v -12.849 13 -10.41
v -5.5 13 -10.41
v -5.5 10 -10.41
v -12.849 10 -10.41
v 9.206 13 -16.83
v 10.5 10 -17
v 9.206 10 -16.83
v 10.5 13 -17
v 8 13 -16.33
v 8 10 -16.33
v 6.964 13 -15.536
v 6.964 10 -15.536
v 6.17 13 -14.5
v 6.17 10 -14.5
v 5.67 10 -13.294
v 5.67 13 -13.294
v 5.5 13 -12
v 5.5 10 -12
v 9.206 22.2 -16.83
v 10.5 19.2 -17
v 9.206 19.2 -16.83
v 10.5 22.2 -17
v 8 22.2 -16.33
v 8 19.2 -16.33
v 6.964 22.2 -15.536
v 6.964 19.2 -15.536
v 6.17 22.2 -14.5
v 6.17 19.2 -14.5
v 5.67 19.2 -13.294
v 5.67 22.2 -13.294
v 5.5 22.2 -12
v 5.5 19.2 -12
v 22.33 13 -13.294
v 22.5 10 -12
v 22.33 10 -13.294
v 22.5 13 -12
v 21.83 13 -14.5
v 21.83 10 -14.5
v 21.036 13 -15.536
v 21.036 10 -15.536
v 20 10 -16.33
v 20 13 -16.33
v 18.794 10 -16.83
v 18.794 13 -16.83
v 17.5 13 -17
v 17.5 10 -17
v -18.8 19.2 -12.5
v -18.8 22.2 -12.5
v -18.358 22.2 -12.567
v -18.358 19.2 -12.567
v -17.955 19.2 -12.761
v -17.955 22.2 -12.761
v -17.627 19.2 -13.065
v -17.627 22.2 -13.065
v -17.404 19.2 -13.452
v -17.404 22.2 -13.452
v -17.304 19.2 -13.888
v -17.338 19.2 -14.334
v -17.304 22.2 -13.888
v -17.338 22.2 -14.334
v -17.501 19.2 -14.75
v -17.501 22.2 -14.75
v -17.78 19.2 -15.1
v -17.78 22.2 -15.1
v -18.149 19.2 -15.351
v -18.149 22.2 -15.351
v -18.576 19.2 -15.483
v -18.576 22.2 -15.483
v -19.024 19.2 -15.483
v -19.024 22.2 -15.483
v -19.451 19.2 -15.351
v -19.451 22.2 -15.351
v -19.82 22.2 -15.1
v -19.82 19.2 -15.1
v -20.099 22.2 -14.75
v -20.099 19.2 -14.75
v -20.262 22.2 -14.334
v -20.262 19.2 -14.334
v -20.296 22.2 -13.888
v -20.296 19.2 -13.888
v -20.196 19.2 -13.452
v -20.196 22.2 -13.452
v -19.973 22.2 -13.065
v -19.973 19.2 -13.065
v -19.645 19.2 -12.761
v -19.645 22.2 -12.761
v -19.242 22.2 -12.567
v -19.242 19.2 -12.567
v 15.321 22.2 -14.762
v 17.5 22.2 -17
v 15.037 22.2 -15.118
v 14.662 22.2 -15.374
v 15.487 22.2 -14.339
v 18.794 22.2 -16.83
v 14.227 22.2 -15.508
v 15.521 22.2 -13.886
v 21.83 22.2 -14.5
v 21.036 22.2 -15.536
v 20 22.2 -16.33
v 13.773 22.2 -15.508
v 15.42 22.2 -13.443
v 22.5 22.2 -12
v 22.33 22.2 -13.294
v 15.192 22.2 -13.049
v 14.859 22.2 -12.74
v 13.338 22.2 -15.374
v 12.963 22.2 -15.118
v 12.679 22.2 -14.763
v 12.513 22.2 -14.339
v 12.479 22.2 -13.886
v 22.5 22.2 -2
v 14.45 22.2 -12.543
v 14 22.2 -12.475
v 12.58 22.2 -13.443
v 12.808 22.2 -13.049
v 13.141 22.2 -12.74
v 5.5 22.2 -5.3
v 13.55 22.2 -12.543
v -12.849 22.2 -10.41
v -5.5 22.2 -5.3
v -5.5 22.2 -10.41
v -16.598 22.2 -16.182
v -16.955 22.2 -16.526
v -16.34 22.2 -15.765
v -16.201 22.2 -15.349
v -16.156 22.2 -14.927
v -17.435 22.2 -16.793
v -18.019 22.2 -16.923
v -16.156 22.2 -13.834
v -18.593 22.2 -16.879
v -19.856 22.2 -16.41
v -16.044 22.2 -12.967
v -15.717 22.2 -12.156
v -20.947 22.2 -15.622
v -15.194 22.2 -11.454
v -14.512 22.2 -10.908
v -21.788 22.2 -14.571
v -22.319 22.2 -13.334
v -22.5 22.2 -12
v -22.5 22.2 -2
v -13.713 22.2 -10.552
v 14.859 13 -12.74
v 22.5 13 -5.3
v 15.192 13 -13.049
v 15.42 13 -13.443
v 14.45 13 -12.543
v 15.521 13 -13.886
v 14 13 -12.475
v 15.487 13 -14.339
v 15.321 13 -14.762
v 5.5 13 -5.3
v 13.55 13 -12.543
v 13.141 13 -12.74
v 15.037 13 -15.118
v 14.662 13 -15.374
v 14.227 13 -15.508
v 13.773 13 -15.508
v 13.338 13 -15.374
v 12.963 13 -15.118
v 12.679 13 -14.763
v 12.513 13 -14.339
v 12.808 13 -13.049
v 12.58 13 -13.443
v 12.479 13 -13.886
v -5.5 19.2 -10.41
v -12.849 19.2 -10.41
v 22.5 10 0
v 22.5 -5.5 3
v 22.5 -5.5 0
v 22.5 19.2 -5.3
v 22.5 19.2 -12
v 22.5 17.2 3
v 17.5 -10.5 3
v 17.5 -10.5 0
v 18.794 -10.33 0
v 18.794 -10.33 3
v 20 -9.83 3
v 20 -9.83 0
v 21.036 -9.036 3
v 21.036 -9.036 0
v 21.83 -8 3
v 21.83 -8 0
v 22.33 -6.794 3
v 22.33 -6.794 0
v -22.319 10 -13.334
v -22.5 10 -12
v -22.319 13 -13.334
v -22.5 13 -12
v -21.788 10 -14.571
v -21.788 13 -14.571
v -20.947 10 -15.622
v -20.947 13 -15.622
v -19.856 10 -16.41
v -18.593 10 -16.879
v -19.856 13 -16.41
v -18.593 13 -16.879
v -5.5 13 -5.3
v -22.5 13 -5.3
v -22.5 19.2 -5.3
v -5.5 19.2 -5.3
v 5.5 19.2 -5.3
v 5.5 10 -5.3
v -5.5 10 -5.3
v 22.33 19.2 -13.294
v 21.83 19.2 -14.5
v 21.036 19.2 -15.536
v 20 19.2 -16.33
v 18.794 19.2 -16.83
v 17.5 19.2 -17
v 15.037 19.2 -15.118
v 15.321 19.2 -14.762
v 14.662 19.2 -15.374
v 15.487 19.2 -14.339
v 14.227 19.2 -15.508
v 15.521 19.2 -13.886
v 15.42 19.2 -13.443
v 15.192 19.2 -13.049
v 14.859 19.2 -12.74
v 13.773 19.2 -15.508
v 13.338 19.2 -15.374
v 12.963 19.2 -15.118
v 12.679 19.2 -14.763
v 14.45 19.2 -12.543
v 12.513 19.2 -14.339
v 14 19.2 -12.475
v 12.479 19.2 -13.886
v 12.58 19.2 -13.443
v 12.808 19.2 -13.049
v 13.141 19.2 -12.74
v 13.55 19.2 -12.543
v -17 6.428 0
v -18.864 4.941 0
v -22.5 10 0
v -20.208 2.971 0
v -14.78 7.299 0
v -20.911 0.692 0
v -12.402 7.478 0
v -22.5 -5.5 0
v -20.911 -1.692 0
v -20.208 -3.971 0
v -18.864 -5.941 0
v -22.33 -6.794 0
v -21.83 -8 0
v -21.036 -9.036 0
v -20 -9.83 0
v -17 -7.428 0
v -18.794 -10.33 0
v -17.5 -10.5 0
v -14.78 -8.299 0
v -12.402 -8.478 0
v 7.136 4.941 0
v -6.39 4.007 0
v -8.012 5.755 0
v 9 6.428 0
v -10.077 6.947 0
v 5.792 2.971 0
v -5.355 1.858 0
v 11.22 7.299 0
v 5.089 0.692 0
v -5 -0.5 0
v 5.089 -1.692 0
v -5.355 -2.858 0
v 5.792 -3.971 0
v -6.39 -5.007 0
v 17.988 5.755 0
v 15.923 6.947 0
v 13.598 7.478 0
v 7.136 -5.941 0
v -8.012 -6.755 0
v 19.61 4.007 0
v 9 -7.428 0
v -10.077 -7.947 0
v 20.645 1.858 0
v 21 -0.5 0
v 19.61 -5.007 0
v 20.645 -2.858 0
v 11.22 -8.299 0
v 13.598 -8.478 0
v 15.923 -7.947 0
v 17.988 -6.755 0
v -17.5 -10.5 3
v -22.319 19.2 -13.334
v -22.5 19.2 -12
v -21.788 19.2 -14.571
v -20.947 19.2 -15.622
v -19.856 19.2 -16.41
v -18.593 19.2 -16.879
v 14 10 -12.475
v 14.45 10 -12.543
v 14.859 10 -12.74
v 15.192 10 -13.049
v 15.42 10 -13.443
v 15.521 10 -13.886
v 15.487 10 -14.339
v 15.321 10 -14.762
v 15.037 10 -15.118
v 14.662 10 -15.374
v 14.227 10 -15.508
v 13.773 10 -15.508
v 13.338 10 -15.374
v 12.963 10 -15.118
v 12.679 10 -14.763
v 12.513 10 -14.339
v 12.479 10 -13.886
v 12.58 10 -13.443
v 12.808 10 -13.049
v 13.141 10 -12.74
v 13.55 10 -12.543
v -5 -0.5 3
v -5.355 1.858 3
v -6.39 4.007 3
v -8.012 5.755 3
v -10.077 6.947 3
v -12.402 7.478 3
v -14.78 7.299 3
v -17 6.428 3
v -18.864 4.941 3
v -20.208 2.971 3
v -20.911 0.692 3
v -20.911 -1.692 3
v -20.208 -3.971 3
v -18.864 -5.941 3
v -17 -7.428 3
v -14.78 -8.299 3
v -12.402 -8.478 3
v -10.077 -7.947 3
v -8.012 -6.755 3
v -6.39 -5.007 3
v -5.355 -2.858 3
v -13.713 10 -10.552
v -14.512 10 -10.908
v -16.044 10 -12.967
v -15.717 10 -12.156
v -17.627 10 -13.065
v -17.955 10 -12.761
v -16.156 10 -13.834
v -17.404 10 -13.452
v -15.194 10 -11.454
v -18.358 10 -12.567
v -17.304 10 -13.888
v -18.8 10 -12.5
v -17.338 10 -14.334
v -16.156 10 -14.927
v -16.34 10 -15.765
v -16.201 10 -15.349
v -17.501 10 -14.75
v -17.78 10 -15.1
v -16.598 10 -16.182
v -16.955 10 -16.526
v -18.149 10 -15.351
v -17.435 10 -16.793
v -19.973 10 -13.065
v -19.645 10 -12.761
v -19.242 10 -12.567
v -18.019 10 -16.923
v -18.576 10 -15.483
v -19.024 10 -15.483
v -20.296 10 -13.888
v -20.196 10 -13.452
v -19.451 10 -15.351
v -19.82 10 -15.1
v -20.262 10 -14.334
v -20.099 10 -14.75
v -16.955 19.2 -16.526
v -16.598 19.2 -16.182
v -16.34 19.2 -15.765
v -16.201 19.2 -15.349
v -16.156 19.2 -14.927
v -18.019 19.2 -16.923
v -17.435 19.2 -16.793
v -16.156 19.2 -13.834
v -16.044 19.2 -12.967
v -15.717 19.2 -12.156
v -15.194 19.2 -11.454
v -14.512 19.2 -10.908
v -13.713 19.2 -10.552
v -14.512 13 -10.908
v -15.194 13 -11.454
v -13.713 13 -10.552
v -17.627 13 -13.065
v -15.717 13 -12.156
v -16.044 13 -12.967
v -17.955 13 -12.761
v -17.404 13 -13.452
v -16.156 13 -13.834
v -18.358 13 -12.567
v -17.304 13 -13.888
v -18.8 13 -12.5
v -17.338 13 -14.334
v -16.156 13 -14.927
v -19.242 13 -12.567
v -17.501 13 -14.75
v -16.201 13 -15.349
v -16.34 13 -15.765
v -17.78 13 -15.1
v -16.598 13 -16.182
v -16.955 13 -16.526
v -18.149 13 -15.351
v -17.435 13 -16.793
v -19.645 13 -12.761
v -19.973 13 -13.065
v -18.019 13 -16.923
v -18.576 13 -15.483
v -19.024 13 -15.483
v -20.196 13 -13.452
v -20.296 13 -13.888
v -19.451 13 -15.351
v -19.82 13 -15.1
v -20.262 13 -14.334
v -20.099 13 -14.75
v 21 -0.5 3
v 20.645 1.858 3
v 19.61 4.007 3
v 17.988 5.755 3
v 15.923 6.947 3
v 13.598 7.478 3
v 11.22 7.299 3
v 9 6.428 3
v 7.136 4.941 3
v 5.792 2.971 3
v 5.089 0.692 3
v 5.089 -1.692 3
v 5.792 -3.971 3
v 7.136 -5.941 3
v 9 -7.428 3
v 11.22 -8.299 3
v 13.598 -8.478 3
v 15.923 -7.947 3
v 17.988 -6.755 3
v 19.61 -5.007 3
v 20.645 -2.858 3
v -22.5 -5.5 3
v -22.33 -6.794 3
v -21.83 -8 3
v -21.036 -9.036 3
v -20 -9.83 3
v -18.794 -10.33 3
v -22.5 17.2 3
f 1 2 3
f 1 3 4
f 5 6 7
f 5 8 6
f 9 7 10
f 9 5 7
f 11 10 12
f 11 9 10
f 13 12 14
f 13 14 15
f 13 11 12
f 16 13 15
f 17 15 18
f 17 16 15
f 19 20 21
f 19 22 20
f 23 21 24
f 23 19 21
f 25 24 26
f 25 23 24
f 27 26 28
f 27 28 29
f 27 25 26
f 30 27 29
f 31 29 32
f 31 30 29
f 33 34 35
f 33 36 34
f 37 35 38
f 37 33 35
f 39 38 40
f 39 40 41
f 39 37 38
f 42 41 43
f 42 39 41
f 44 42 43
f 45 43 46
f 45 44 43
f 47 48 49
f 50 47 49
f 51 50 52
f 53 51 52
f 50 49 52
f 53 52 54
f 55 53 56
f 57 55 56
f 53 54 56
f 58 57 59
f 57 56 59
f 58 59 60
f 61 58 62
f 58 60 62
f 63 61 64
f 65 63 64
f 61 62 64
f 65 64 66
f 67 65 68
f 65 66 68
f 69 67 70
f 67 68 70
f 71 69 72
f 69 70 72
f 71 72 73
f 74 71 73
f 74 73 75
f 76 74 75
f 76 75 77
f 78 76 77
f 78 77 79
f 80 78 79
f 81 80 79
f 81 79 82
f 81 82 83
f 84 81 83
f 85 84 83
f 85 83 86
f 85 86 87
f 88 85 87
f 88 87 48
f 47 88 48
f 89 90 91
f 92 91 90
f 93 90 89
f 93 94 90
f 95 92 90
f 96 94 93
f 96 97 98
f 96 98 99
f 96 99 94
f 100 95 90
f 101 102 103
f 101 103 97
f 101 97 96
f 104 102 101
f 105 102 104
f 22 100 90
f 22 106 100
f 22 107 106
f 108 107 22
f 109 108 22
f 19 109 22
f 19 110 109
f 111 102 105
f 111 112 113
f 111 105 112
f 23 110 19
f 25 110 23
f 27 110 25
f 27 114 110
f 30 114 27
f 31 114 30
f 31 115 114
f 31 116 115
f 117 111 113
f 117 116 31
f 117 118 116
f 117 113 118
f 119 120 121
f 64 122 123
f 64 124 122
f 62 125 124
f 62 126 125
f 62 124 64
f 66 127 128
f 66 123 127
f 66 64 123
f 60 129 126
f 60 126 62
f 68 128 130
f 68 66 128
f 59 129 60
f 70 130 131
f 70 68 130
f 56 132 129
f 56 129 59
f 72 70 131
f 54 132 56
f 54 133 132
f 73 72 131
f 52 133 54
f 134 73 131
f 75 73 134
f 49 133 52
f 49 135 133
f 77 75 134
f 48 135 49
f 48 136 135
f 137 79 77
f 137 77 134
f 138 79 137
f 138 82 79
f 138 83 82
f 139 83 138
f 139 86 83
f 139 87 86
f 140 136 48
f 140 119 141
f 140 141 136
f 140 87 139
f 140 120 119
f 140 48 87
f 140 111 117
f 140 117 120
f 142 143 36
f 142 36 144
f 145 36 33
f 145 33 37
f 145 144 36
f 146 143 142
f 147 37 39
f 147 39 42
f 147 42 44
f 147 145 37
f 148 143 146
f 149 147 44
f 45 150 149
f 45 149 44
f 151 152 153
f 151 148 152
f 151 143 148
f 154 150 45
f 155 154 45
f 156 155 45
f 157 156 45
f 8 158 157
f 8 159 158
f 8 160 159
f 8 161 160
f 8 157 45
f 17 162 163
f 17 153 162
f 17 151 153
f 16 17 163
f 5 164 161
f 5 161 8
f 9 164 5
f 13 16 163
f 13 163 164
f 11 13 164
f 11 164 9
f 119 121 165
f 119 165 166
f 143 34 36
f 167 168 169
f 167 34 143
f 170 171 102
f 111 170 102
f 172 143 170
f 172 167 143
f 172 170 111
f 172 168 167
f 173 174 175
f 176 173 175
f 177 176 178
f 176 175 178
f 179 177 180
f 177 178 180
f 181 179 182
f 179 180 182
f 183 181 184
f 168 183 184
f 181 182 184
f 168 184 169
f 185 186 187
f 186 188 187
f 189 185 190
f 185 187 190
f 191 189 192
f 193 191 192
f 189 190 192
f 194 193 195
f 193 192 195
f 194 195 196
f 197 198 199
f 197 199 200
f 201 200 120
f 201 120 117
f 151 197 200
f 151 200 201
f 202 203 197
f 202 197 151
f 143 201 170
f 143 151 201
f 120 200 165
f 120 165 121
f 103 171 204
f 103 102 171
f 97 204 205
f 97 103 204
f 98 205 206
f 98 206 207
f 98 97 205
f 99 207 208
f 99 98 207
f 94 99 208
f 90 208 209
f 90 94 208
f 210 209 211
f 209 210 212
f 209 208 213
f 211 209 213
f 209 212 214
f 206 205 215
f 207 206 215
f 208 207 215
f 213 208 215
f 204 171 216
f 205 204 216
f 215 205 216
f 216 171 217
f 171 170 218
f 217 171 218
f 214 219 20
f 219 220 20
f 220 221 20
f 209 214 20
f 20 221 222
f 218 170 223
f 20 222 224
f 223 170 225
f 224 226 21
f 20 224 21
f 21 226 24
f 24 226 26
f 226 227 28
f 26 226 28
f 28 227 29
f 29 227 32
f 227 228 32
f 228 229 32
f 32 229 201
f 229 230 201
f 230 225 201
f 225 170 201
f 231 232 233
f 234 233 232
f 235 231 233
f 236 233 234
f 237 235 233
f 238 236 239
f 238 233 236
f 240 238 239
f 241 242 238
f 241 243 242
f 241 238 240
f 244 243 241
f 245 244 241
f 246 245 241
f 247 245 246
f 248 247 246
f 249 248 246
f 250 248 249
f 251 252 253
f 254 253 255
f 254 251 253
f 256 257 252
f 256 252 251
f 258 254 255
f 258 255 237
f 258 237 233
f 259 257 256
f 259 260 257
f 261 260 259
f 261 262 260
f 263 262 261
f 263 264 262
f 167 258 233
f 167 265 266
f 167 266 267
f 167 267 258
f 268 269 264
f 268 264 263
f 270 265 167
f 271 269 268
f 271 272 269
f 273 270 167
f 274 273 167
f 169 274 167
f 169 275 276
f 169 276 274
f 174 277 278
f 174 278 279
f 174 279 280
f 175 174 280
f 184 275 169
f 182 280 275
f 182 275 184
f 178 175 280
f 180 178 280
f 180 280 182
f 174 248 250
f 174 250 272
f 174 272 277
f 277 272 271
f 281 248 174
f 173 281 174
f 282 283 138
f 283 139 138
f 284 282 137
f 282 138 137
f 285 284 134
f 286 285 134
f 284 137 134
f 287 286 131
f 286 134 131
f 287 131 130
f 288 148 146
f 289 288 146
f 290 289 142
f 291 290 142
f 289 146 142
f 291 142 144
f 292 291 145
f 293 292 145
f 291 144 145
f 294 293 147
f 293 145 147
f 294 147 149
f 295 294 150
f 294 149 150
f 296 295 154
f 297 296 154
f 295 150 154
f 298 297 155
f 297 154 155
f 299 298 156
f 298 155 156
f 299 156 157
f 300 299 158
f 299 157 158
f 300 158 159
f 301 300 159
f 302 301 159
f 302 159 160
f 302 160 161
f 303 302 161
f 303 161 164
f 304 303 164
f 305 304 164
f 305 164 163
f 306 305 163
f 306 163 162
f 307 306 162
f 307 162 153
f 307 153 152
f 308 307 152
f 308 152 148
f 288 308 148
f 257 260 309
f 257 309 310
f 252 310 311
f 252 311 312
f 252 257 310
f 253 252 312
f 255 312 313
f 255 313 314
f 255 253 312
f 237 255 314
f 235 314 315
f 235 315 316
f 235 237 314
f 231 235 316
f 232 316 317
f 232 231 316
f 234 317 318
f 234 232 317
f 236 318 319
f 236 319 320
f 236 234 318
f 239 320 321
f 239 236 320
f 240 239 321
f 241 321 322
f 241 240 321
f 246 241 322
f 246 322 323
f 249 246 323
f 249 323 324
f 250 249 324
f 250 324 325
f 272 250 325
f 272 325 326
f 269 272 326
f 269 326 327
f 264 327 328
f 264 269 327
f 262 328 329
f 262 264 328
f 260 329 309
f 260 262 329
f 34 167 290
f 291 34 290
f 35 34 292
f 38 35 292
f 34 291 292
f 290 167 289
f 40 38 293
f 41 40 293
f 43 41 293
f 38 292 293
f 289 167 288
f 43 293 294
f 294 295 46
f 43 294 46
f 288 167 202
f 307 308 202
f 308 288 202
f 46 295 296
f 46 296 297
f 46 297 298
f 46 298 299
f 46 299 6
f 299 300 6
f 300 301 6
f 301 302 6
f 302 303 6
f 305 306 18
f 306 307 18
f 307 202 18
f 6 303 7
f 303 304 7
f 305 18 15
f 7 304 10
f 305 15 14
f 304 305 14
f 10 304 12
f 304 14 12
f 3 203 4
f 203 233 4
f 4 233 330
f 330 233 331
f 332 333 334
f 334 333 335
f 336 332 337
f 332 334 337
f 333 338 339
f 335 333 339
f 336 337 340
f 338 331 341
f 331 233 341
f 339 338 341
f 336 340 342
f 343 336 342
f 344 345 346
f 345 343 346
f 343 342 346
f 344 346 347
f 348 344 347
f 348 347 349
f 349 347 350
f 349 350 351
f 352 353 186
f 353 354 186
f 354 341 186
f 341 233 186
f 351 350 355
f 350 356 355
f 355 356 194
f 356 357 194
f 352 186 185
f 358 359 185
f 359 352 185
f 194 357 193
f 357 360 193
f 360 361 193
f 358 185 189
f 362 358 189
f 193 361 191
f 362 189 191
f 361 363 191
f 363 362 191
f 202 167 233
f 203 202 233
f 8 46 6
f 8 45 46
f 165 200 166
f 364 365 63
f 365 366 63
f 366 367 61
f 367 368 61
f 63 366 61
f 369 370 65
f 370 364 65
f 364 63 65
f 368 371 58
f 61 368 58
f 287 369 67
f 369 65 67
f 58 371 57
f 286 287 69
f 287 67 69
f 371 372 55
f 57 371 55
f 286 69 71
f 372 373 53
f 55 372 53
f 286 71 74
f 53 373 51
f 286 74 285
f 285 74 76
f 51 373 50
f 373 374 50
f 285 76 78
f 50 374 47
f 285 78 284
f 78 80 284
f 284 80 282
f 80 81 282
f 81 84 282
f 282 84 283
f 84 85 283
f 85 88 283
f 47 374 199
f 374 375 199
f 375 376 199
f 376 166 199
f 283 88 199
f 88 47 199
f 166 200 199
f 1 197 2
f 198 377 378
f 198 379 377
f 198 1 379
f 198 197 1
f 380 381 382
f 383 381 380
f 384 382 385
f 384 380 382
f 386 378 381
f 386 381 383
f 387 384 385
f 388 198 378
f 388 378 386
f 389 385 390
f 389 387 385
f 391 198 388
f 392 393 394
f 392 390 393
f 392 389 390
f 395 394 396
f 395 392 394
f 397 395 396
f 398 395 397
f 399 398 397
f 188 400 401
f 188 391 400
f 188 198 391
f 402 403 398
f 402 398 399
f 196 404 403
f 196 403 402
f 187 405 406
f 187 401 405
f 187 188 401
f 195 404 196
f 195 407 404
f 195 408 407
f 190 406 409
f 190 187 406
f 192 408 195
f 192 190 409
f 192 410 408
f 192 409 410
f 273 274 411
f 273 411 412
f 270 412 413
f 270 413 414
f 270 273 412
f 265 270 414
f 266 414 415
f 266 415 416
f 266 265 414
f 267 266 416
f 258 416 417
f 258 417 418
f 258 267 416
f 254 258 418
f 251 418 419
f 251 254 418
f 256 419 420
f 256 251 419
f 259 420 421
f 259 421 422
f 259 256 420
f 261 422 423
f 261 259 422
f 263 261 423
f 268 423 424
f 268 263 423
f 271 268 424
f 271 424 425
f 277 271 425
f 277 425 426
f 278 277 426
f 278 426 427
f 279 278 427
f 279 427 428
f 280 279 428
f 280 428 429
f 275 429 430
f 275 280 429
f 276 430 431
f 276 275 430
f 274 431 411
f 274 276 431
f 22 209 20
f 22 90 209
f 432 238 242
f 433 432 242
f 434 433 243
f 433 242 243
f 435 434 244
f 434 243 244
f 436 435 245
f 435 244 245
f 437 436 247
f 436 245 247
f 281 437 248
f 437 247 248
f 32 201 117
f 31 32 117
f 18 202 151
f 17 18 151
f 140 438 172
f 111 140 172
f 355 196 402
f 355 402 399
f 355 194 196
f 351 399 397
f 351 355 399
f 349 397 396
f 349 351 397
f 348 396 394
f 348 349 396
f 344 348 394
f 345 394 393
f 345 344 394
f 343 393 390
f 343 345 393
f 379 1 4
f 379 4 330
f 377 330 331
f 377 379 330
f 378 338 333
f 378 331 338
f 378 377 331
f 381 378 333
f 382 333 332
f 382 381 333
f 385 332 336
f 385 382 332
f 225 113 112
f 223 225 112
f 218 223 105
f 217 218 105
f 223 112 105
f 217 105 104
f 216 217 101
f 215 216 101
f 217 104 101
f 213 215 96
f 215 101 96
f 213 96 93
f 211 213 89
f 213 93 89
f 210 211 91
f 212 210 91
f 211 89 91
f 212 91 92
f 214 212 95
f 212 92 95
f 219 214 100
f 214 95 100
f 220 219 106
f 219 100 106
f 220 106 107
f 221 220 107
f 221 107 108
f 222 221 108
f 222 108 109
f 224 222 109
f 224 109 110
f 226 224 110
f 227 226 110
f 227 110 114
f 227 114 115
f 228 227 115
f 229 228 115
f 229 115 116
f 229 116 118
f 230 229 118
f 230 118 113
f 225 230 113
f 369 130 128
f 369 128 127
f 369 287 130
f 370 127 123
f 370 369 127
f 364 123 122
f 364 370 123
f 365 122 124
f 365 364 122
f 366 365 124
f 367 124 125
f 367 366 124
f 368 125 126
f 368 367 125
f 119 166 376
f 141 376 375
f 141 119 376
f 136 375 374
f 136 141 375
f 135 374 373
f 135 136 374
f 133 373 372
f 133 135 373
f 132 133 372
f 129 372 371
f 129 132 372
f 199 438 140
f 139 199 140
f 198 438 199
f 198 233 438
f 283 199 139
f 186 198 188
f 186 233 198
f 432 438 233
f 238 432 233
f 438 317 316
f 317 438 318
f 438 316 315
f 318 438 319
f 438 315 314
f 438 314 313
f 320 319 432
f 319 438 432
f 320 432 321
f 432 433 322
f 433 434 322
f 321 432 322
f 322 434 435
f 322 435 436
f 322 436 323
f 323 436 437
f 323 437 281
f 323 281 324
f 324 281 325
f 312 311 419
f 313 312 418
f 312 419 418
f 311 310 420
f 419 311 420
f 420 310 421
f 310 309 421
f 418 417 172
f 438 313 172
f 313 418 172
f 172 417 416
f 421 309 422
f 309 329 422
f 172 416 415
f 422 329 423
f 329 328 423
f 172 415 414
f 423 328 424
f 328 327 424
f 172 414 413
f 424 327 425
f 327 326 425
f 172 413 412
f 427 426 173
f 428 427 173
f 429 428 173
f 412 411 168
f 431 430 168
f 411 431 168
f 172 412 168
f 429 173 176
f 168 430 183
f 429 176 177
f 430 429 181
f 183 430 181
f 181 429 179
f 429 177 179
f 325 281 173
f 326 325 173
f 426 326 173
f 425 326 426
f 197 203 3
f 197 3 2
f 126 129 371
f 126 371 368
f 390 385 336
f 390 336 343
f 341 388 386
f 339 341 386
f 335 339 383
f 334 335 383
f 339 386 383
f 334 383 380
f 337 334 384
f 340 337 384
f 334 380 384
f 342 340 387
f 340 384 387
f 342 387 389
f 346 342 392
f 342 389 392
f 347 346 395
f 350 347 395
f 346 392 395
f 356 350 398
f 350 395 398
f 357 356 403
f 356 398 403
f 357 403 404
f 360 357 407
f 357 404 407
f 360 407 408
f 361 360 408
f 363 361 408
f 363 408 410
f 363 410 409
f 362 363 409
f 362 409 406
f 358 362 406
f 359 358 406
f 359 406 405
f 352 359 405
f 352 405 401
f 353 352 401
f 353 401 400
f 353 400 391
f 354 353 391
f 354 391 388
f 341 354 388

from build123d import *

# Parameters (mm, degrees)
SKETCH1_R           = 8
BOSS_EXTRUDE1_DEPTH = 3
SKETCH2_W           = 17
SKETCH2_H           = 3
BOSS_EXTRUDE2_DEPTH = 17
SKETCH3_W           = 45
SKETCH3_H           = 3
BOSS_EXTRUDE3_DEPTH = 9.2
BOSS_EXTRUDE4_REACH = 41.571
SKETCH4_W           = 5.3
SKETCH4_H           = 3
SKETCH6_W           = 45
SKETCH6_H           = 5.3
BOSS_EXTRUDE5_DEPTH = 9.2
SKETCH7_W           = 17
SKETCH7_H           = 3
BOSS_EXTRUDE6_DEPTH = 11.7
SKETCH8_R           = 1.525
CUT_EXTRUDE1_DEPTH  = 44.180319591
CHAMFER1_SIZE       = 5
FILLET1_R           = 5
SKETCH9_R           = 1.5
SKETCH9_R_2         = 1.525
CUT_EXTRUDE2_DEPTH  = 44.180319591
FILLET2_R           = 2


with BuildPart() as part:
    # Sketch1 → Boss-Extrude1 (new body)
    with BuildSketch(Plane.XY):
        with BuildLine():
            Line((-17.5, -10.5), (17.5, -10.5))
            ThreePointArc((17.5, -10.5), (21.035533906, -9.035533906), (22.5, -5.5))
            Line((22.5, -5.5), (22.5, 10.5))
            Line((22.5, 10.5), (22.5, 13))
            Line((22.5, 13), (-22.5, 13))
            Line((-22.5, 13), (-22.5, 10.5))
            Line((-22.5, 10.5), (-22.5, -5.5))
            ThreePointArc((-22.5, -5.5), (-21.035533906, -9.035533906), (-17.5, -10.5))
        make_face()
        with Locations((13, -0.5)):
            Circle(SKETCH1_R, mode=Mode.SUBTRACT)
        with Locations((-13, -0.5)):
            Circle(SKETCH1_R, mode=Mode.SUBTRACT)
    extrude(amount=BOSS_EXTRUDE1_DEPTH)

    # Sketch2 → Boss-Extrude2 (add)
    with BuildSketch(Plane(origin=(0, 0, 0), x_dir=(-1, 0, 0), z_dir=(0, 0, -1))):
        with Locations((-14, 11.5)):
            Rectangle(SKETCH2_W, SKETCH2_H)
        with Locations((14, 11.5)):
            Rectangle(SKETCH2_W, SKETCH2_H)
    extrude(amount=BOSS_EXTRUDE2_DEPTH)

    # Sketch3 → Boss-Extrude3 (add)
    with BuildSketch(Plane(origin=(0, 13, 0), x_dir=(1, 0, 0), z_dir=(0, 1, 0))):
        with Locations((0, -1.5)):
            Rectangle(SKETCH3_W, SKETCH3_H)
    extrude(amount=BOSS_EXTRUDE3_DEPTH)

    # Sketch4 → Boss-Extrude4 (add, up to next)
    with BuildSketch(Plane(origin=(-5.5, 0, 0), x_dir=(0, 0, -1), z_dir=(1, 0, 0)), mode=Mode.PRIVATE) as boss_extrude4_sk1:
        with Locations((2.65, 11.5)):
            Rectangle(SKETCH4_W, SKETCH4_H)
    boss_extrude4_tool1 = extrude(boss_extrude4_sk1.sketch, amount=BOSS_EXTRUDE4_REACH, mode=Mode.PRIVATE) - part.part
    add(boss_extrude4_tool1.solids().sort_by_distance((-5.5, 11.5, -2.65))[0])

    # Sketch6 → Boss-Extrude5 (add)
    with BuildSketch(Plane(origin=(0, 13, 0), x_dir=(1, 0, 0), z_dir=(0, 1, 0))):
        with Locations((0, 2.65)):
            Rectangle(SKETCH6_W, SKETCH6_H)
    extrude(amount=BOSS_EXTRUDE5_DEPTH)

    # Sketch7 → Boss-Extrude6 (add, through all)
    with BuildSketch(Plane(origin=(0, 0, -5.3), x_dir=(-1, 0, 0), z_dir=(0, 0, -1))):
        with Locations((-14, 20.7)):
            Rectangle(SKETCH7_W, SKETCH7_H)
        with Locations((14, 20.7)):
            Rectangle(SKETCH7_W, SKETCH7_H)
    extrude(amount=BOSS_EXTRUDE6_DEPTH)

    # Sketch8 → Cut-Extrude1 (cut, through all)
    with BuildSketch(Plane(origin=(0, 22.2, 0), x_dir=(1, 0, 0), z_dir=(0, 1, 0))):
        with Locations(Location((14, 14, 0), (0, 0, 270))):
            Circle(SKETCH8_R)
        with Locations(Location((-14, 14, 0), (0, 0, 270))):
            Circle(SKETCH8_R)
    extrude(amount=-CUT_EXTRUDE1_DEPTH, mode=Mode.SUBTRACT)

    # Chamfer1
    chamfer1_edges = [part.edges().sort_by_distance(p)[0] for p in [
        (0, 22.2, 3),
    ]]
    chamfer(chamfer1_edges, length=CHAMFER1_SIZE)

    # Fillet1
    fillet1_edges = [part.edges().sort_by_distance(p)[0] for p in [
        (22.5, 20.7, -17),
        (5.5, 20.7, -17),
        (-22.5, 20.7, -17),
        (-5.5, 20.7, -17),
        (5.5, 11.5, -17),
        (22.5, 11.5, -17),
        (-5.5, 11.5, -17),
        (-22.5, 11.5, -17),
    ]]
    fillet(fillet1_edges, radius=FILLET1_R)

    # Sketch9 → Cut-Extrude2 (cut, through all)
    # profile 1 of 2: a face of its own
    with BuildSketch(Plane(origin=(0, 22.2, 0), x_dir=(1, 0, 0), z_dir=(0, 1, 0))):
        with Locations(Location((-18.8, 14, 0), (0, 0, 270))):
            Circle(SKETCH9_R)
    # profile 2 of 2: a face of its own
    with BuildSketch(Plane(origin=(0, 22.2, 0), x_dir=(1, 0, 0), z_dir=(0, 1, 0))):
        with BuildLine():
            Line((-5.5, 10.41), (-12.349475382, 10.41))
            Line((-12.349475382, 10.41), (-12.849475382, 10.41))
            ThreePointArc((-12.849475382, 10.41), (-15.194497894, 11.45415993), (-16.156081538, 13.834235021))
            Line((-16.156081538, 13.834235021), (-16.156081538, 17))
            Line((-16.156081538, 17), (-10.5, 17))
            ThreePointArc((-10.5, 17), (-6.964466094, 15.535533906), (-5.5, 12))
            Line((-5.5, 12), (-5.5, 10.41))
        make_face()
        with Locations((-14, 14)):
            Circle(SKETCH9_R_2, mode=Mode.SUBTRACT)
    extrude(amount=-CUT_EXTRUDE2_DEPTH, mode=Mode.SUBTRACT)

    # Fillet2
    fillet2_edges = [part.edges().sort_by_distance(p)[0] for p in [
        (-16.156081538, 20.7, -17),
        (-16.156081538, 11.5, -17),
    ]]
    fillet(fillet2_edges, radius=FILLET2_R)


solid = part.part
